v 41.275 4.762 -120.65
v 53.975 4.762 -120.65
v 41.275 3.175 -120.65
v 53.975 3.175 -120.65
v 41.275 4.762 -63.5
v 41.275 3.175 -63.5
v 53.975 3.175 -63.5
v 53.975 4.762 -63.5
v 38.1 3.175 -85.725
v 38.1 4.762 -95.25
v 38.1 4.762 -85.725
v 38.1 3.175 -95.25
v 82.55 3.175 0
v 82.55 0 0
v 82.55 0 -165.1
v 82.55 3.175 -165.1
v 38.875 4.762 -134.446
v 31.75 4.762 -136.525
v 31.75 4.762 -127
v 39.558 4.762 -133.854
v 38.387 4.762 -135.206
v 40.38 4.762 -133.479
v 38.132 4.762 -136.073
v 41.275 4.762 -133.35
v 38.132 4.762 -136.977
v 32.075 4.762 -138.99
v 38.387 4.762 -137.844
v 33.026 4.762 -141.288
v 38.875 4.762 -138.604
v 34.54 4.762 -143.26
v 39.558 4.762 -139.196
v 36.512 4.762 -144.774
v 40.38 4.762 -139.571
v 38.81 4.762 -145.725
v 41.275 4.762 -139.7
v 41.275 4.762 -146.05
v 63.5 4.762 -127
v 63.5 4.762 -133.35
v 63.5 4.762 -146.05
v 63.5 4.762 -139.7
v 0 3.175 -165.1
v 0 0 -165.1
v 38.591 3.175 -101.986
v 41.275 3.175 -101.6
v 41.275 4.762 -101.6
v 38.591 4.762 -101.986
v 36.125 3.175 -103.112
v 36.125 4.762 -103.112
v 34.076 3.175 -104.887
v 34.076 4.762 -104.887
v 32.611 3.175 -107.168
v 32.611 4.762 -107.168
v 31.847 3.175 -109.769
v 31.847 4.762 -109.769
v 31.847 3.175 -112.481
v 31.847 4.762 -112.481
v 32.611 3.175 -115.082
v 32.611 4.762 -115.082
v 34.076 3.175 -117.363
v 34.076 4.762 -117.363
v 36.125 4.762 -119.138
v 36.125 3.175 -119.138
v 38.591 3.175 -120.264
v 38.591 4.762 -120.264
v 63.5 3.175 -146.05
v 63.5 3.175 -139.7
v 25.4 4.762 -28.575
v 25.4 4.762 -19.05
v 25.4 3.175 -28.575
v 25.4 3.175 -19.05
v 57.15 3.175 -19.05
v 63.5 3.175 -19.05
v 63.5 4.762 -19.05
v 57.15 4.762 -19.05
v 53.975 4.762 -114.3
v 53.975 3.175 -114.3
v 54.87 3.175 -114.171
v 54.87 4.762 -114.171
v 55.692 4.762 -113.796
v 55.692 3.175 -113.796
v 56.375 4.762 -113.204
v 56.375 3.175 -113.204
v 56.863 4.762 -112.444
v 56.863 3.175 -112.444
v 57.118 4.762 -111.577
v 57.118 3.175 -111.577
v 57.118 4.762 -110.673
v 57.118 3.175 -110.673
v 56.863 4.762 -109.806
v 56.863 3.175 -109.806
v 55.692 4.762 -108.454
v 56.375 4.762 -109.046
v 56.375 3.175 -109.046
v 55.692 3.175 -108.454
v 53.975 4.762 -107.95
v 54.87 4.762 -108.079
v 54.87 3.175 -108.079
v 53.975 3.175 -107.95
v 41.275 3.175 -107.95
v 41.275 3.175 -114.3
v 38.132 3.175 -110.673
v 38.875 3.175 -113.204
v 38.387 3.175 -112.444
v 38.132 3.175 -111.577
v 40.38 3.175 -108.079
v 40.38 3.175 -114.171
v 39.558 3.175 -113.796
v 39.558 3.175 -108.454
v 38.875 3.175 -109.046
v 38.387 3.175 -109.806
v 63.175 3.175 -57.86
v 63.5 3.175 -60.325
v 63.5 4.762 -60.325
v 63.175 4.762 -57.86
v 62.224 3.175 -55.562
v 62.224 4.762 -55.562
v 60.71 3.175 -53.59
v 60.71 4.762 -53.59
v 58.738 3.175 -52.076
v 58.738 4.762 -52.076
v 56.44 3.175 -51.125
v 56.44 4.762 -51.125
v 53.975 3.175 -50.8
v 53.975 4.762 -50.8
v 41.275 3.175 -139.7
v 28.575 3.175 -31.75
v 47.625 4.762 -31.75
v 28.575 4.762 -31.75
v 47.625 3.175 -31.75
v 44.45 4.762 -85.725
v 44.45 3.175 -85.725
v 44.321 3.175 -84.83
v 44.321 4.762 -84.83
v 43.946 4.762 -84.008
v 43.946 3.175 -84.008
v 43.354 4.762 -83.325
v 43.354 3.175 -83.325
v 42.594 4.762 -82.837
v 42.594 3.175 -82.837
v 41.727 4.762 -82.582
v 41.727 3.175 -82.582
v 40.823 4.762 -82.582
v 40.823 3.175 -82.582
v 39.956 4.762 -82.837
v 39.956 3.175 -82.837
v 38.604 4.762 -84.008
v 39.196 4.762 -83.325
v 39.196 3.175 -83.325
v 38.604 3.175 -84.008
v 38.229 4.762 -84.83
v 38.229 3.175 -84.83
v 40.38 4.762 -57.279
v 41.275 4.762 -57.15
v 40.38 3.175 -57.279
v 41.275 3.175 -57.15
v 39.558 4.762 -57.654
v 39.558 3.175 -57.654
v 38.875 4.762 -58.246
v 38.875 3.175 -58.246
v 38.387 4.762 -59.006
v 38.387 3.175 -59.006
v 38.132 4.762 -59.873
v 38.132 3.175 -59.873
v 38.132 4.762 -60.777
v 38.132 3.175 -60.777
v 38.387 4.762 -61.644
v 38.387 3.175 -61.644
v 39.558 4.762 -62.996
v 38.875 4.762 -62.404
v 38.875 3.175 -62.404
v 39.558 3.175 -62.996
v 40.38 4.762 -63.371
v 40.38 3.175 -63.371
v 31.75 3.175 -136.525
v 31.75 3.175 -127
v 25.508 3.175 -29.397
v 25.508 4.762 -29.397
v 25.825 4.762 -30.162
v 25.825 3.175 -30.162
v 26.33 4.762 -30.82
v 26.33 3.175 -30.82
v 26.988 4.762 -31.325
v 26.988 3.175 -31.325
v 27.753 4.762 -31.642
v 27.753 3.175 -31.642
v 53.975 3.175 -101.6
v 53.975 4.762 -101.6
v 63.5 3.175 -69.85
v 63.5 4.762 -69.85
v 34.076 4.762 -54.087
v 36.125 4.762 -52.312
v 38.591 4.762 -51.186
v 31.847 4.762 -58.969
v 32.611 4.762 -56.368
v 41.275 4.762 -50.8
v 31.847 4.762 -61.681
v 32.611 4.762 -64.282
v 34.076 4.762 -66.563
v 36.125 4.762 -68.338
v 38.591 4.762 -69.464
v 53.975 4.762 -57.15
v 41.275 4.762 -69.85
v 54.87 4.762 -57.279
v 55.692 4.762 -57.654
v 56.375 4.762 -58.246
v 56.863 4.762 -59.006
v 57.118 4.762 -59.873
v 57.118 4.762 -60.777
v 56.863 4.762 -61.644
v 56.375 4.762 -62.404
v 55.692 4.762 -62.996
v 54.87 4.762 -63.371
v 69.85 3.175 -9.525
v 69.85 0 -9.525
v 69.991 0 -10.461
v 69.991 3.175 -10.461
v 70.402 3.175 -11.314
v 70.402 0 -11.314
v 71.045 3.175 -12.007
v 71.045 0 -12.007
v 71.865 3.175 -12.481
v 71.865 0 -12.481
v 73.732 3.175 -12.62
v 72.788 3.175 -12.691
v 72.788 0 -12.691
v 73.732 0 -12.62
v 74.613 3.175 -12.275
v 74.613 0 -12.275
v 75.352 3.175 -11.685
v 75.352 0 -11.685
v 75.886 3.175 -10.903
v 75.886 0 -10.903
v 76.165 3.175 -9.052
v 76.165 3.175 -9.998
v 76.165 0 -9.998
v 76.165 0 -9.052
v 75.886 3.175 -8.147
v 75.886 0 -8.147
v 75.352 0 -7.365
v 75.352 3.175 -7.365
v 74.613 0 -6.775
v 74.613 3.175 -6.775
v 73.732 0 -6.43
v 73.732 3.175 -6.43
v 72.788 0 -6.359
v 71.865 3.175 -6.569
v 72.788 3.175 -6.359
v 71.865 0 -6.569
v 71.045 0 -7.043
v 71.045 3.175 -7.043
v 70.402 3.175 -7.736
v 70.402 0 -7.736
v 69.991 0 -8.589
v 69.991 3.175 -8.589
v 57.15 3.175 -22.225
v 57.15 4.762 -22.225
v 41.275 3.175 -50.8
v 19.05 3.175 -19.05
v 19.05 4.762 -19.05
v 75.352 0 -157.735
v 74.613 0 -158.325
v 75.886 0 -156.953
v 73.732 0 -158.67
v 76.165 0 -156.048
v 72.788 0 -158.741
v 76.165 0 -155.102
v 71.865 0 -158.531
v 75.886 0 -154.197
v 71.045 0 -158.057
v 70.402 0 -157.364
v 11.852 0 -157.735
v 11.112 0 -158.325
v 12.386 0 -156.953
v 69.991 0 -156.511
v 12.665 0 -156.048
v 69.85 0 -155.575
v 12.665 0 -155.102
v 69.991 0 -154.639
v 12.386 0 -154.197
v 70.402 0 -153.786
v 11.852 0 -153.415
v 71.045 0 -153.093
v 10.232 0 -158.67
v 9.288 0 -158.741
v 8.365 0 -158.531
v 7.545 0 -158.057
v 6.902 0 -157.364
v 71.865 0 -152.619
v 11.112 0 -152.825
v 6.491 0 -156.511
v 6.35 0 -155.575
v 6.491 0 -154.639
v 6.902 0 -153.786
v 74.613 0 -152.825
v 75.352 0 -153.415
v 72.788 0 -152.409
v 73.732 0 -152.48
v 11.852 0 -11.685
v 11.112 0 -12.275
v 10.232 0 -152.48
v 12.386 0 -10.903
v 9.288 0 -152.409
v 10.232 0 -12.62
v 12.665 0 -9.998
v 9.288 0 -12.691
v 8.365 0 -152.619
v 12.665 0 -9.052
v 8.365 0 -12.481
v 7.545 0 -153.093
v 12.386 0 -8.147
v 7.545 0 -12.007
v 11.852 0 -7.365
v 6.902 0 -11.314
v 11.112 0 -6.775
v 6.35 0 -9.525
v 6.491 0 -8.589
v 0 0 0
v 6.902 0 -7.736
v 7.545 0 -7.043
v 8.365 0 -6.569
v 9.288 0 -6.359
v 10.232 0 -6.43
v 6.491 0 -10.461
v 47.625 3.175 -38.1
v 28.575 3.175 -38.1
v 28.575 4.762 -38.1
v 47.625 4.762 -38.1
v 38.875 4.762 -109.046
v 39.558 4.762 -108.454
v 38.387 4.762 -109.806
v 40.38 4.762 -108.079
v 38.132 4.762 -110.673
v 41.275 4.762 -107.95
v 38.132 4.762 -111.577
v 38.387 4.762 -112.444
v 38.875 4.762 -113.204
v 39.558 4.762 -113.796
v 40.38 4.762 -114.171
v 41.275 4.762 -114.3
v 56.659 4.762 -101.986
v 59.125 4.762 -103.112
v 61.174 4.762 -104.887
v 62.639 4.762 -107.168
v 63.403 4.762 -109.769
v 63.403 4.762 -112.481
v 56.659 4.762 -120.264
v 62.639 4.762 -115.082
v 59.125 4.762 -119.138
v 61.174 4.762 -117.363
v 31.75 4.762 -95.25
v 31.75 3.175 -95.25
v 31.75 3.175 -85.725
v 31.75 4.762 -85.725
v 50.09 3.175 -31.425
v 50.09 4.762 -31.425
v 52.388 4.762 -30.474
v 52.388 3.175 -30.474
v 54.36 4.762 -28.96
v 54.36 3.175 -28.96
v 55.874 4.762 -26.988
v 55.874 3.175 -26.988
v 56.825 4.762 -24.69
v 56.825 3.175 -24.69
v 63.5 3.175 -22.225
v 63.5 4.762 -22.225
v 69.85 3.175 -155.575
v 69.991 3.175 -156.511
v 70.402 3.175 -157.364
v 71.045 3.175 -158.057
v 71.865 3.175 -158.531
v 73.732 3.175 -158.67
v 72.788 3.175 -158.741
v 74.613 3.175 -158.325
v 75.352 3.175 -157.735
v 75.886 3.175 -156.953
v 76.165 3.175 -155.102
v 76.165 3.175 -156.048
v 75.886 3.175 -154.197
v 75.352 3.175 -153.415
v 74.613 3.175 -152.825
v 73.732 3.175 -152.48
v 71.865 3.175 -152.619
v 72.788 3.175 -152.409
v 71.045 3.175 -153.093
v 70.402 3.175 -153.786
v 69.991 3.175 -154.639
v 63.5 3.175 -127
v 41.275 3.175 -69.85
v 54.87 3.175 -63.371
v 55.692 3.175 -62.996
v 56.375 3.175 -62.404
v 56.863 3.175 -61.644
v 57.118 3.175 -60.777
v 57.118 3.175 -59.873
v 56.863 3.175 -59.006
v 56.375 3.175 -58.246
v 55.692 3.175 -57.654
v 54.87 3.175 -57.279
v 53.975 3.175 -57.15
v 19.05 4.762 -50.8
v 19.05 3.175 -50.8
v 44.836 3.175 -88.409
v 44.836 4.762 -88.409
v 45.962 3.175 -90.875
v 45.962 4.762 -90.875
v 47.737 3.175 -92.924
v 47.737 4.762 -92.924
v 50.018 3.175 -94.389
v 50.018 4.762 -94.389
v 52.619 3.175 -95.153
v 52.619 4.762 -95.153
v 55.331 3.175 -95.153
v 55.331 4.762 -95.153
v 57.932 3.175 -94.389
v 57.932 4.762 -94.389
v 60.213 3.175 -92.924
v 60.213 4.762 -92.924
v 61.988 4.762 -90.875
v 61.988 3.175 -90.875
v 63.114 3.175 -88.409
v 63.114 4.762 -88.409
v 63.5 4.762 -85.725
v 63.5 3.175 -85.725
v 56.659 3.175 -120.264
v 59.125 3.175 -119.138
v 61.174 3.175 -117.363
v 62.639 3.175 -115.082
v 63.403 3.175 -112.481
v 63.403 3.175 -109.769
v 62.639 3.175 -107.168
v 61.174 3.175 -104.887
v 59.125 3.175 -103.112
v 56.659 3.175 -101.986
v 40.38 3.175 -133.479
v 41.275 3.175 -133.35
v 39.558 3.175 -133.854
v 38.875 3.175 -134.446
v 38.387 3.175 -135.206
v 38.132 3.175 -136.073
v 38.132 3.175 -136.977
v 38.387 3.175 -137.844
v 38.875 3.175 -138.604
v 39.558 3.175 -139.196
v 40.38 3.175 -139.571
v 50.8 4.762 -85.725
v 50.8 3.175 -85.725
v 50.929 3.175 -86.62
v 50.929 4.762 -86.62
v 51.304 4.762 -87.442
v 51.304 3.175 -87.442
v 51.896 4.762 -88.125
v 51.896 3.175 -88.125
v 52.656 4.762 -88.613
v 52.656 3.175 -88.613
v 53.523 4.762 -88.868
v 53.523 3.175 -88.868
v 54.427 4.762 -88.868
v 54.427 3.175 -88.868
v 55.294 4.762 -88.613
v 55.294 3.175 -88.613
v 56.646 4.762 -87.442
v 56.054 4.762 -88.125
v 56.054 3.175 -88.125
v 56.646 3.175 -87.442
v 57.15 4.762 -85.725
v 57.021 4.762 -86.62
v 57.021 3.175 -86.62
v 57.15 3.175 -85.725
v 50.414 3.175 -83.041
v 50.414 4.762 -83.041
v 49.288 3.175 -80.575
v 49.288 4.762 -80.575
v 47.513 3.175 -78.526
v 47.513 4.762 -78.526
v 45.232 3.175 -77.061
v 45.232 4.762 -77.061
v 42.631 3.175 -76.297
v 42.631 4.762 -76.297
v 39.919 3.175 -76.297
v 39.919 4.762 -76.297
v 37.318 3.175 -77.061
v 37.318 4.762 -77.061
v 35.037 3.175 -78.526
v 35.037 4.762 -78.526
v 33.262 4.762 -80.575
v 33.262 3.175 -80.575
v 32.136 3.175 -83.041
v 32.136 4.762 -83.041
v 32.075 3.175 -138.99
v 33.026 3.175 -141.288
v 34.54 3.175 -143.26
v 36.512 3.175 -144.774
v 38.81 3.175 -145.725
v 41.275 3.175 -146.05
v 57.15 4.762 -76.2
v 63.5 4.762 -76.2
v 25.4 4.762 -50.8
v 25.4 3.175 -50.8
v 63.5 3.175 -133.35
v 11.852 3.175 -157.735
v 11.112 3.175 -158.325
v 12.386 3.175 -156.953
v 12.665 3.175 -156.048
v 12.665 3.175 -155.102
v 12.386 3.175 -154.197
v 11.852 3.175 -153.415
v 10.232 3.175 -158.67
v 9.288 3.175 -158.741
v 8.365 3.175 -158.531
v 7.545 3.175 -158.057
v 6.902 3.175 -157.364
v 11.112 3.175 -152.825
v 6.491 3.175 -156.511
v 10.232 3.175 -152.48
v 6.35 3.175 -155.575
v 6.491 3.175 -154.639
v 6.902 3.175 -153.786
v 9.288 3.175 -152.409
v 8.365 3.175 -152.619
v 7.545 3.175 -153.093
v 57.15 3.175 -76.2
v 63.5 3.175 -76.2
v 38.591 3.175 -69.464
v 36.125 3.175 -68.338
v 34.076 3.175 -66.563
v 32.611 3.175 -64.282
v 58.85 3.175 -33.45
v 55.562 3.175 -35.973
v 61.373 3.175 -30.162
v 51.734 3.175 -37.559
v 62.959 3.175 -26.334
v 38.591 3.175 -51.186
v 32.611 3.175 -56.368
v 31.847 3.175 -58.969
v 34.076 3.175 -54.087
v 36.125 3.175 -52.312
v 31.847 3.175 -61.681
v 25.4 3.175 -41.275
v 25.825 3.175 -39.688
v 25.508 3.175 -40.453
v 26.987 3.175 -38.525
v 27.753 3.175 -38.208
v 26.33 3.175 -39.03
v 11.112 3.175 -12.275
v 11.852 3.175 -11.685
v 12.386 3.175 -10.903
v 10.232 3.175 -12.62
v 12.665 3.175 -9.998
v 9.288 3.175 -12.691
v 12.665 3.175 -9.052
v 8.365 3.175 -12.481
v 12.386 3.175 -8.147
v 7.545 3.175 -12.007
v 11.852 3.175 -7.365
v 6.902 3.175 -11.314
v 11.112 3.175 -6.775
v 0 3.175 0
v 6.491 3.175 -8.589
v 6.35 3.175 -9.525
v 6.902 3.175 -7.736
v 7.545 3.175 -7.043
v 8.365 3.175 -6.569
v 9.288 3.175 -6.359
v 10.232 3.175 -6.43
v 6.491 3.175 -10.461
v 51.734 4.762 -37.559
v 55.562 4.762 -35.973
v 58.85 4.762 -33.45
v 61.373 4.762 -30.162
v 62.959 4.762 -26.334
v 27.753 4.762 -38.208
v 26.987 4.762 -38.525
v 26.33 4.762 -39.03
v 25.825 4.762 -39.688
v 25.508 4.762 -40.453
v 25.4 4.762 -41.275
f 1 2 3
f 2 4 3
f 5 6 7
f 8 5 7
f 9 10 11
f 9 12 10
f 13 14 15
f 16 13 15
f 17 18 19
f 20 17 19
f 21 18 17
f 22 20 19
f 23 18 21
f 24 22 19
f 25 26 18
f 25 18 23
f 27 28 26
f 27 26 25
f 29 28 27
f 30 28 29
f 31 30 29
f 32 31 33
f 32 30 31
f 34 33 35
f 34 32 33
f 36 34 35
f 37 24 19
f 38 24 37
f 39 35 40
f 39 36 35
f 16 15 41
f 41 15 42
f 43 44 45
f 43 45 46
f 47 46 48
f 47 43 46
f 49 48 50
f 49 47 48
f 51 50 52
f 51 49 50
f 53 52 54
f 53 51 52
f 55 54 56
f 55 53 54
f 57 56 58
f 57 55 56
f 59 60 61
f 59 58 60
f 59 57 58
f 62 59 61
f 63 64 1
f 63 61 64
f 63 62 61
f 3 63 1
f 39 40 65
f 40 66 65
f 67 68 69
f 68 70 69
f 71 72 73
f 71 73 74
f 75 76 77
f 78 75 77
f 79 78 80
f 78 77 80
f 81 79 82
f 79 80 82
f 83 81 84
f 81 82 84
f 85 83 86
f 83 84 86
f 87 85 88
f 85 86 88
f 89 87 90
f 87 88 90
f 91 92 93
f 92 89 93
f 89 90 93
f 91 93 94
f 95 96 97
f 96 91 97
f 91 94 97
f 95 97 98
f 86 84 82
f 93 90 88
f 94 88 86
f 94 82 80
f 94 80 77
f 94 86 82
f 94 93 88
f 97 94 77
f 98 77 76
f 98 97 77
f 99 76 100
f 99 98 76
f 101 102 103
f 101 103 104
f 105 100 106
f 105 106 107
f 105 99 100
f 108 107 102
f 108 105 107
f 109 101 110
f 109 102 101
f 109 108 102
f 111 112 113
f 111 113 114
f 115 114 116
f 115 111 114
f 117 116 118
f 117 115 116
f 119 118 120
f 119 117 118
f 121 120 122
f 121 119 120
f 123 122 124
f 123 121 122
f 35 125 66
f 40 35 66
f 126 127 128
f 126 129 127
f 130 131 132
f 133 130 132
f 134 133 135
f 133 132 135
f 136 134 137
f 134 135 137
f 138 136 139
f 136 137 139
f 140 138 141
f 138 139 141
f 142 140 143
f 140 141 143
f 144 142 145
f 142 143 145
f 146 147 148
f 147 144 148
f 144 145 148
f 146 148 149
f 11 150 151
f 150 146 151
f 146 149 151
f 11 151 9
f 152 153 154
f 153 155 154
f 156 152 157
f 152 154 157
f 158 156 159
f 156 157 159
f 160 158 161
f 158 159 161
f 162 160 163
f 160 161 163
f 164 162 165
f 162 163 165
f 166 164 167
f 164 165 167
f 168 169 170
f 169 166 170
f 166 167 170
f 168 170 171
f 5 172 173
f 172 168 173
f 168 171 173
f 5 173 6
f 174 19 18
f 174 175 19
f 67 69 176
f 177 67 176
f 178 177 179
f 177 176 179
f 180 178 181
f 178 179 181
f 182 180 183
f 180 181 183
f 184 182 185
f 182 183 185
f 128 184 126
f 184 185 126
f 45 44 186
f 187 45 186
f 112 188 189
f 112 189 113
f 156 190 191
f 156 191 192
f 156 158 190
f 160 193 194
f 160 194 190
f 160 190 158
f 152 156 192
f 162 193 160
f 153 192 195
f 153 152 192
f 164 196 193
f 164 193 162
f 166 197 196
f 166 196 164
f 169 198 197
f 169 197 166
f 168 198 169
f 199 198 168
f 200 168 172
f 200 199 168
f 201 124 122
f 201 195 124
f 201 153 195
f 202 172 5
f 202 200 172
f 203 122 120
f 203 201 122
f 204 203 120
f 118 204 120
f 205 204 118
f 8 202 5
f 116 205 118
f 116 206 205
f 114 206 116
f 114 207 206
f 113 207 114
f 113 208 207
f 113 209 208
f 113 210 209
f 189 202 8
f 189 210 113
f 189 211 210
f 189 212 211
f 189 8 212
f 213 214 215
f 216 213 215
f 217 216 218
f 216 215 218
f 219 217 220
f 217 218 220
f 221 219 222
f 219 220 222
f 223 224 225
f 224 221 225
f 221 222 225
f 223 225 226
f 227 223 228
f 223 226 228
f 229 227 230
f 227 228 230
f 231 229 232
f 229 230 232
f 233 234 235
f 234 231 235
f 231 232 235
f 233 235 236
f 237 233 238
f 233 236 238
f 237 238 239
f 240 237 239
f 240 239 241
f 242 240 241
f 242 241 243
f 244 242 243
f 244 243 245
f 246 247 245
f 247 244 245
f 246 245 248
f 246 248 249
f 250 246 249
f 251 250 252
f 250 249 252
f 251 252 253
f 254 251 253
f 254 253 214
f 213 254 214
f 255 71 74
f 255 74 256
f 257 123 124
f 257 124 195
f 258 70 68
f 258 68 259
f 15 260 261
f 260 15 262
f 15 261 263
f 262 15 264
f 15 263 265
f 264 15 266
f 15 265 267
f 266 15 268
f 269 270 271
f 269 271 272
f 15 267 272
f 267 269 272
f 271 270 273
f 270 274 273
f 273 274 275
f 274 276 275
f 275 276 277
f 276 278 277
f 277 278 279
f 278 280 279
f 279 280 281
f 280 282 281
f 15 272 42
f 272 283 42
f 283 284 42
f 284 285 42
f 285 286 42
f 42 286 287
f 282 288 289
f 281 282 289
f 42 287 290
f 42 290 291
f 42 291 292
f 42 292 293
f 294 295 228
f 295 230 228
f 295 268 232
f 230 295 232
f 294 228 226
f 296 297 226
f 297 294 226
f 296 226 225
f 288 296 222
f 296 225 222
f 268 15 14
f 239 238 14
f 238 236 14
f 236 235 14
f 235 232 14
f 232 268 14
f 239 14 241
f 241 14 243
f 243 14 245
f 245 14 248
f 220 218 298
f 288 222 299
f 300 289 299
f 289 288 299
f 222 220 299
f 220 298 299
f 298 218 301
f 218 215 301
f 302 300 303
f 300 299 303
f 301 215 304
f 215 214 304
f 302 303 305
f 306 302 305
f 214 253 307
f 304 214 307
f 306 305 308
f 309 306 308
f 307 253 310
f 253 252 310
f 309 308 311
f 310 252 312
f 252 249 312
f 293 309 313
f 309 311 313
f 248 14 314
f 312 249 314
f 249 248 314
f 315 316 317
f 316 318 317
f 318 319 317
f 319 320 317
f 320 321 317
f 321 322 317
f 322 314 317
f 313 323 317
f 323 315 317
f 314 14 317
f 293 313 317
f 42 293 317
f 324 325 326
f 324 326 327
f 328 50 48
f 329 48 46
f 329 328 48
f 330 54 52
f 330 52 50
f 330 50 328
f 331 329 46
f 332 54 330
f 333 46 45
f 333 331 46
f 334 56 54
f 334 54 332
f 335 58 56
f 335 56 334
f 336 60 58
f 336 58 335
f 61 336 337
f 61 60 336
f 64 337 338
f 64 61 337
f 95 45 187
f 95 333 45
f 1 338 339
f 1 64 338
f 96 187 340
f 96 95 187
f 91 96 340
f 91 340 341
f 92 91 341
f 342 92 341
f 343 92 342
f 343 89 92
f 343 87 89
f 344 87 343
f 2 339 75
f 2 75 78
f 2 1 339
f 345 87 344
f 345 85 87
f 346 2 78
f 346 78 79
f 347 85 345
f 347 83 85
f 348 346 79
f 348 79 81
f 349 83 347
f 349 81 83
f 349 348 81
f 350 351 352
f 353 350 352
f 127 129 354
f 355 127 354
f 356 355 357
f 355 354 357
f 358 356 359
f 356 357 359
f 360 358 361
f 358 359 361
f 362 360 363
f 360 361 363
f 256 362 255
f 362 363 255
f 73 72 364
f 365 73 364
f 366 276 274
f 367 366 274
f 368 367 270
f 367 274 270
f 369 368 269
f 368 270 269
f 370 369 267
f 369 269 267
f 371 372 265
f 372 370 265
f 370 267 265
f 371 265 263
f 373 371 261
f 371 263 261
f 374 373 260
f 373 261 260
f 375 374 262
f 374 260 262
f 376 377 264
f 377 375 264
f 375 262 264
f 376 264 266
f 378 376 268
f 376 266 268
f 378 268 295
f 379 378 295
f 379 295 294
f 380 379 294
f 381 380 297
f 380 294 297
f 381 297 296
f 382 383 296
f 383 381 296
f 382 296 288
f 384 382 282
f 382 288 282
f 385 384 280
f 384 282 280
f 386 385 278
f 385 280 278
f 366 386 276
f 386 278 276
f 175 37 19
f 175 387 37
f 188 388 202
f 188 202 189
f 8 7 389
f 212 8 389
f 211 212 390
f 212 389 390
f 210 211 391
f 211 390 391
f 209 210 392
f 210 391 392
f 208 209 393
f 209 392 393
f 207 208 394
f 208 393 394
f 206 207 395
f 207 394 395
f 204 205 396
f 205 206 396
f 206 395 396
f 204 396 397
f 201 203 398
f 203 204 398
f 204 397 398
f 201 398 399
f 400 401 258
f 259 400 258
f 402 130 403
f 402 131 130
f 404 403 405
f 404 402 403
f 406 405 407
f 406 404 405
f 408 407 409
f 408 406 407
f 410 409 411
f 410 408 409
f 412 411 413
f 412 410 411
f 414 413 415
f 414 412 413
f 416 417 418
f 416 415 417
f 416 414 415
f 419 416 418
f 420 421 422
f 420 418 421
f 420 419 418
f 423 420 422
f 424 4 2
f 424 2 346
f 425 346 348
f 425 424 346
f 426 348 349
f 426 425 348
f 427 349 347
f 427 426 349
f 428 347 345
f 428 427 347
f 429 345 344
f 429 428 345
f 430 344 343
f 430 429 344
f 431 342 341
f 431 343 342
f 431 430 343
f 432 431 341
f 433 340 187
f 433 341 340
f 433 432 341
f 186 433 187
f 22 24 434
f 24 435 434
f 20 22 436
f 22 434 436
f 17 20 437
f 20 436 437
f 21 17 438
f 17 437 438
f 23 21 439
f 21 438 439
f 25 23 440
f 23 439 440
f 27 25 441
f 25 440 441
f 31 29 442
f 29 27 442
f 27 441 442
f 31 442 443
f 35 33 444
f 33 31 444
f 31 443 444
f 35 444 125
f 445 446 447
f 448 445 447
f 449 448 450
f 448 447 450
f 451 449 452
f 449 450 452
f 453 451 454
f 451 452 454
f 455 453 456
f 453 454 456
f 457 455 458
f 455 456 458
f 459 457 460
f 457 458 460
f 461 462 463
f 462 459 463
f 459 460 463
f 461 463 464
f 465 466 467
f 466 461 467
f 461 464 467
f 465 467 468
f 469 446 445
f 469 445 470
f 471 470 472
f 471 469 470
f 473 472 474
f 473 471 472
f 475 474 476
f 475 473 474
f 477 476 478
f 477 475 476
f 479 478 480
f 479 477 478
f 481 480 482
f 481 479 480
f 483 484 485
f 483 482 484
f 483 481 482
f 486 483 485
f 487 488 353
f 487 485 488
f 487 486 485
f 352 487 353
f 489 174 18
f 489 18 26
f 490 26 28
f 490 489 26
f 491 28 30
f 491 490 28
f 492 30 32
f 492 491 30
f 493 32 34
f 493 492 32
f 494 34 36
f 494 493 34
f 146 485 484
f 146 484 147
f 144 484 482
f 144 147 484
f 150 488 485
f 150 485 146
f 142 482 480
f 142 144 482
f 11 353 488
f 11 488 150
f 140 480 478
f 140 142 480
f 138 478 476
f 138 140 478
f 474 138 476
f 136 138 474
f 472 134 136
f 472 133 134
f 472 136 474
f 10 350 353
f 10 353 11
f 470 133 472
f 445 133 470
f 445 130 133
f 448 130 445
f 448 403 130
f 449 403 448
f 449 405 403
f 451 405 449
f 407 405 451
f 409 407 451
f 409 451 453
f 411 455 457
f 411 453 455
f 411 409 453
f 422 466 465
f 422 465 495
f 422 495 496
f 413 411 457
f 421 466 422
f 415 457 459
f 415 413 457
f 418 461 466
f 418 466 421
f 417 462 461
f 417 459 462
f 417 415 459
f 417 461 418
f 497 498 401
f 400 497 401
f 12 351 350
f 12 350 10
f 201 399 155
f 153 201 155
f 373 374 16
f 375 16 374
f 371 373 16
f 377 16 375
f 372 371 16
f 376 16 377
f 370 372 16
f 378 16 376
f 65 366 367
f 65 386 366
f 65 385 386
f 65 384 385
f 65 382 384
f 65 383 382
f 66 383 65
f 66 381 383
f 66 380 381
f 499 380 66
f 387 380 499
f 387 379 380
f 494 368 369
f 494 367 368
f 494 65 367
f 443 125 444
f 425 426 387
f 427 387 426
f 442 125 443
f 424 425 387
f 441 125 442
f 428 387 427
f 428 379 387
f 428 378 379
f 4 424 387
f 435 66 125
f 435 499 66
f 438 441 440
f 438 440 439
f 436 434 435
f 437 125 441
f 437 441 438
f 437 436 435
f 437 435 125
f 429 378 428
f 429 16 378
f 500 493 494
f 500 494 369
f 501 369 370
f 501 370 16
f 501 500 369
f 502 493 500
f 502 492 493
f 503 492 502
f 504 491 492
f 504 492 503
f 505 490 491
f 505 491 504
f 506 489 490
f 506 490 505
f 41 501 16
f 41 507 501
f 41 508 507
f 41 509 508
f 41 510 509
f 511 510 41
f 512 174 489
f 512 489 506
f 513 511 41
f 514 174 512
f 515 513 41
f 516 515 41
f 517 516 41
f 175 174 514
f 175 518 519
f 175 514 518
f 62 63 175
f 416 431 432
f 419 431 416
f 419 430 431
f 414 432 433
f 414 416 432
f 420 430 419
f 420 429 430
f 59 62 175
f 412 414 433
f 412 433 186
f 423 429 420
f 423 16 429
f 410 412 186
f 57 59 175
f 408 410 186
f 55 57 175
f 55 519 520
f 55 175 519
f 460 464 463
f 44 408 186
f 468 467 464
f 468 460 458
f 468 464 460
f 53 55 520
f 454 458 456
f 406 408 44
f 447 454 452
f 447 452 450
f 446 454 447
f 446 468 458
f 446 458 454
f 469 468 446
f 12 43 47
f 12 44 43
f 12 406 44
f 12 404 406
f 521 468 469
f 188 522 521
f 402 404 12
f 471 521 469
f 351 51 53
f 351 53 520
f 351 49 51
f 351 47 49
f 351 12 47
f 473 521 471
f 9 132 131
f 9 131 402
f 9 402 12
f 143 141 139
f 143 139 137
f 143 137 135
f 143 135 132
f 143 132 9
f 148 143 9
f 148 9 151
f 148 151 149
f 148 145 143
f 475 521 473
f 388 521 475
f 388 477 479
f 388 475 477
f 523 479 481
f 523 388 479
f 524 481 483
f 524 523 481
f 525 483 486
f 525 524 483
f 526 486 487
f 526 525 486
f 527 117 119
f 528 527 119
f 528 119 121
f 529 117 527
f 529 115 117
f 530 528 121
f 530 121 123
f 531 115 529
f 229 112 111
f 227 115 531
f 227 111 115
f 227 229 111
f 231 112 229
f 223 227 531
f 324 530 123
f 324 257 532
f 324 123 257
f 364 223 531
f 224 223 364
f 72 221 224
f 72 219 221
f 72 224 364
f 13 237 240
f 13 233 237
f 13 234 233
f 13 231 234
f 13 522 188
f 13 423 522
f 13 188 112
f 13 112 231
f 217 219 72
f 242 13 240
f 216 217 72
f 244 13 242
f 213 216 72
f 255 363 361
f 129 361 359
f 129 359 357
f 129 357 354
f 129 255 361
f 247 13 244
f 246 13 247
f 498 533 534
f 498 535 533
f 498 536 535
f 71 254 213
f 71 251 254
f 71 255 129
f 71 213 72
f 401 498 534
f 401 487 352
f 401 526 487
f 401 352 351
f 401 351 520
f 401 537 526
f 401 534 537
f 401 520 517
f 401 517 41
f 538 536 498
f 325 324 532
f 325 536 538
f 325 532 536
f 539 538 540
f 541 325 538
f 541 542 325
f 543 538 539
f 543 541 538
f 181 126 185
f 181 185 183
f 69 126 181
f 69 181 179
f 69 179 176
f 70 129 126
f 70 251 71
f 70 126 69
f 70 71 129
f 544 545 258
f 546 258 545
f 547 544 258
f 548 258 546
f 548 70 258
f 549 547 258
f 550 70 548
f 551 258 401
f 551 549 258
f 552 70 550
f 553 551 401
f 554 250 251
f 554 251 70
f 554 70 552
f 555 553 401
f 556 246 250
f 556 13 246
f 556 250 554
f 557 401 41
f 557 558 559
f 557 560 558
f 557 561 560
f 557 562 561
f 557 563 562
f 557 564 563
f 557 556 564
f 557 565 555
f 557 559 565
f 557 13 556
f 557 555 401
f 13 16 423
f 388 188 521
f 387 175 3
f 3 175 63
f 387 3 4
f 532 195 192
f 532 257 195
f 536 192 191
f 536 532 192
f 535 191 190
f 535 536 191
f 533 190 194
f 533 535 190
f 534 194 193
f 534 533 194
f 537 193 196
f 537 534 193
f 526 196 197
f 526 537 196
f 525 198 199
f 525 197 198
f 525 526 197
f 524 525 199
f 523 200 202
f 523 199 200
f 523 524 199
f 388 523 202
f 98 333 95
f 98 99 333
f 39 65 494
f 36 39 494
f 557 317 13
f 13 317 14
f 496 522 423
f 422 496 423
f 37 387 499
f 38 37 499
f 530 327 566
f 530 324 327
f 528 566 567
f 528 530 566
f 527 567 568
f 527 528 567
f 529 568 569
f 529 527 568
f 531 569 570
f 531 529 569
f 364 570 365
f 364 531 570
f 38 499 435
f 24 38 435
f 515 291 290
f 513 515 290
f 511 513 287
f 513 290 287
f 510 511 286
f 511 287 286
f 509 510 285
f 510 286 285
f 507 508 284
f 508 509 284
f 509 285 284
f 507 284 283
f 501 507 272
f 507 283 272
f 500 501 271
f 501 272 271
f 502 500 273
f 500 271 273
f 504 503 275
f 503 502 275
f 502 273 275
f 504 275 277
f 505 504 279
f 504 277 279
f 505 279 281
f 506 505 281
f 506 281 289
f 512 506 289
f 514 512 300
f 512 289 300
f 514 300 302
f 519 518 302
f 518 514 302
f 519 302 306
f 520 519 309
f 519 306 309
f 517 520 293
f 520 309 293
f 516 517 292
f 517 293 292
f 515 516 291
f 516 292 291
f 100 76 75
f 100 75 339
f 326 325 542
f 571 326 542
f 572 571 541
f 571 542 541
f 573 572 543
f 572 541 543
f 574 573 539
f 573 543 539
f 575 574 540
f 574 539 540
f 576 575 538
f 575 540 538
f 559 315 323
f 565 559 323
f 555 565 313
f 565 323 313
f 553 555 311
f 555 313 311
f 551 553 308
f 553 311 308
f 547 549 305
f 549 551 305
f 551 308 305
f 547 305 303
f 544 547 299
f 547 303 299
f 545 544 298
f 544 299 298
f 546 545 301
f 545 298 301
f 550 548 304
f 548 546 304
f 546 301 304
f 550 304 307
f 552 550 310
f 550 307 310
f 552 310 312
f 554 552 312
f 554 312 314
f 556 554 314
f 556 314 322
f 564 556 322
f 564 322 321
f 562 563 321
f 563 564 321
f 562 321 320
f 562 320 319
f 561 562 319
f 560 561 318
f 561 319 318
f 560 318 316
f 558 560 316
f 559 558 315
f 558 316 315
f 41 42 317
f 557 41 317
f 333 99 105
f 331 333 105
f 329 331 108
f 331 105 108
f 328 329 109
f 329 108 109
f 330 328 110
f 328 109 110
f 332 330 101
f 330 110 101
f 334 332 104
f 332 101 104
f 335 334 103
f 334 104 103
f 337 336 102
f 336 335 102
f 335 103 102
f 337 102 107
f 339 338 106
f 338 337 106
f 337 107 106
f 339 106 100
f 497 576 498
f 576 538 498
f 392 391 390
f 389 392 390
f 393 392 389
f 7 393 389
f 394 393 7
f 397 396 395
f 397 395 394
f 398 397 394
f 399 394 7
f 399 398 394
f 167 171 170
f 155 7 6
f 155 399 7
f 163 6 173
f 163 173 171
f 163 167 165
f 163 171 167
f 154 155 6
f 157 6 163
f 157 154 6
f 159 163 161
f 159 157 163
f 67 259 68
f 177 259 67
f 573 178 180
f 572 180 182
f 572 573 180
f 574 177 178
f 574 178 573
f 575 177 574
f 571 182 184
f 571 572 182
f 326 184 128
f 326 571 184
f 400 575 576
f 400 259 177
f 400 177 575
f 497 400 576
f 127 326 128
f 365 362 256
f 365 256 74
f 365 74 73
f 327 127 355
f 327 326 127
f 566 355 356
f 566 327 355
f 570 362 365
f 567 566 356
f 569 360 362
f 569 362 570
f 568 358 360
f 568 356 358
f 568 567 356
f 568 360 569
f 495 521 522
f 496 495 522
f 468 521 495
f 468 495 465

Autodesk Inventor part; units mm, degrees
ref_plane "YZ Plane" through (0, 0, 0) normal (1, 0, 0) x (0, 1, 0)
ref_plane "XZ Plane" through (0, 0, 0) normal (0, 1, 0) x (-1, 0, 0)
ref_plane "XY Plane" through (0, 0, 0) normal (0, 0, 1) x (1, 0, 0)
sketch "Sketch1" plane through (0, 0, 0) normal (0, 1, 0) x (-1, 0, 0)
  line L0 (-82.55, -165.1) -> (0, -165.1)
  line L1 (0, -165.1) -> (0, 0)
  line L2 (0, 0) -> (-82.55, 0)
  line L3 (-82.55, 0) -> (-82.55, -165.1)
  circle A0 centre (-73.025, -155.575) radius 3.175
  circle A1 centre (-73.025, -155.575) radius 3.175
  circle A2 centre (-9.525, -155.575) radius 3.175
  circle A3 centre (-9.525, -155.575) radius 3.175
  circle A4 centre (-73.025, -9.525) radius 3.175
  circle A5 centre (-73.025, -9.525) radius 3.175
  circle A6 centre (-9.525, -9.525) radius 3.175
  circle A7 centre (-9.525, -9.525) radius 3.175
extrude "Extrusion1" add sketch "Sketch1" along normal blind 3.175
sketch "Sketch2" plane through (0, 3.175, 0) normal (0, 1, 0) x (1, 0, 0)
  line L0 (63.5, 19.05) -> (57.15, 19.05)
  line L1 (57.15, 19.05) -> (57.15, 22.225)
  line L2 (63.5, 19.05) -> (63.5, 22.225)
  arc A0 (57.15, 22.225) -> (47.625, 31.75) centre (47.625, 22.225) ccw
  arc A1 (63.5, 22.225) -> (47.625, 38.1) centre (47.625, 22.225) ccw
  line L3 (47.625, 31.75) -> (28.575, 31.75)
  line L4 (28.575, 38.1) -> (47.625, 38.1)
  arc A2 (28.575, 31.75) -> (25.4, 28.575) centre (28.575, 28.575) ccw
  arc A3 (25.4, 41.275) -> (28.575, 38.1) centre (28.575, 41.275) ccw
  line L5 (25.4, 19.05) -> (25.4, 28.575)
  line L6 (25.4, 19.05) -> (19.05, 19.05)
  line L7 (25.4, 41.275) -> (25.4, 50.8)
  line L8 (25.4, 50.8) -> (19.05, 50.8)
  line L9 (19.05, 50.8) -> (19.05, 19.05)
  point P0 (0, 0)
sketch "Sketch3" plane through (0, 3.175, 0) normal (0, 1, 0) x (1, 0, 0)
  point P0 (0, 0)
extrude "Extrusion2" add sketch "Sketch2" along normal blind 1.5875
sketch "Sketch4" plane through (0, 3.175, 0) normal (0, 1, 0) x (1, 0, 0)
  arc A0 (53.975, 57.15) -> (53.975, 63.5) centre (53.975, 60.325) ccw
  line L0 (53.975, 57.15) -> (41.275, 57.15)
  arc A1 (41.275, 63.5) -> (41.275, 57.15) centre (41.275, 60.325) ccw
  line L1 (41.275, 63.5) -> (53.975, 63.5)
  arc A2 (53.975, 50.8) -> (63.5, 60.325) centre (53.975, 60.325) ccw
  line L2 (53.975, 50.8) -> (41.275, 50.8)
  arc A3 (41.275, 69.85) -> (41.275, 50.8) centre (41.275, 60.325) ccw
  line L3 (41.275, 69.85) -> (63.5, 69.85)
  line L4 (63.5, 69.85) -> (63.5, 60.325)
  line L5 (57.15, 76.2) -> (63.5, 76.2)
  line L6 (63.5, 76.2) -> (63.5, 85.725)
  line L7 (57.15, 76.2) -> (57.15, 85.725)
  arc A4 (57.15, 85.725) -> (50.8, 85.725) centre (53.975, 85.725) ccw
  arc A5 (63.5, 85.725) -> (44.45, 85.725) centre (53.975, 85.725) ccw
  arc A6 (38.1, 85.725) -> (44.45, 85.725) centre (41.275, 85.725) ccw
  line L8 (31.75, 95.25) -> (38.1, 95.25)
  line L9 (38.1, 95.25) -> (38.1, 85.725)
  line L10 (41.275, 107.95) -> (53.975, 107.95)
  arc A7 (41.275, 114.3) -> (41.275, 107.95) centre (41.275, 111.125) ccw
  arc A8 (53.975, 107.95) -> (53.975, 114.3) centre (53.975, 111.125) ccw
  line L11 (53.975, 114.3) -> (41.275, 114.3)
  arc A9 (41.275, 120.65) -> (41.275, 101.6) centre (41.275, 111.125) ccw
  line L12 (41.275, 101.6) -> (53.975, 101.6)
  arc A10 (53.975, 101.6) -> (53.975, 120.65) centre (53.975, 111.125) ccw
  line L13 (53.975, 120.65) -> (41.275, 120.65)
  line L14 (63.5, 127) -> (63.5, 133.35)
  line L15 (63.5, 133.35) -> (41.275, 133.35)
  arc A11 (41.275, 139.7) -> (41.275, 133.35) centre (41.275, 136.525) ccw
  line L16 (41.275, 139.7) -> (63.5, 139.7)
  line L17 (63.5, 139.7) -> (63.5, 146.05)
  line L18 (63.5, 146.05) -> (41.275, 146.05)
  arc A12 (41.275, 146.05) -> (31.75, 136.525) centre (41.275, 136.525) ccw
  line L19 (63.5, 127) -> (31.75, 127)
  line L20 (31.75, 127) -> (31.75, 136.525)
  line L21 (57.15, 19.05) -> (57.15, 22.225) projected
  arc A13 (57.15, 22.225) -> (47.625, 31.75) centre (47.625, 22.225) ccw projected
  line L22 (47.625, 31.75) -> (28.575, 31.75) projected
  arc A14 (28.575, 31.75) -> (25.4, 28.575) centre (28.575, 28.575) ccw projected
  line L23 (25.4, 28.575) -> (25.4, 19.05) projected
  line L24 (25.4, 19.05) -> (19.05, 19.05) projected
  line L25 (19.05, 19.05) -> (19.05, 50.8) projected
  line L26 (19.05, 50.8) -> (25.4, 50.8) projected
  line L27 (25.4, 50.8) -> (25.4, 41.275) projected
  arc A15 (25.4, 41.275) -> (28.575, 38.1) centre (28.575, 41.275) ccw projected
  line L28 (28.575, 38.1) -> (47.625, 38.1) projected
  arc A16 (63.5, 22.225) -> (47.625, 38.1) centre (47.625, 22.225) ccw projected
  line L29 (63.5, 22.225) -> (63.5, 19.05) projected
  line L30 (63.5, 19.05) -> (57.15, 19.05) projected
  circle A17 centre (9.525, 9.525) radius 3.175 projected
  circle A18 centre (73.025, 9.525) radius 3.175 projected
  circle A19 centre (9.525, 155.575) radius 3.175 projected
  circle A20 centre (73.025, 155.575) radius 3.175 projected
  line L31 (82.55, 165.1) -> (0, 165.1) projected
  line L32 (0, 165.1) -> (0, 0) projected
  line L33 (0, 0) -> (82.55, 0) projected
  line L34 (82.55, 0) -> (82.55, 165.1) projected
  line L35 (31.75, 95.25) -> (31.75, 85.725)
  arc A21 (31.75, 85.725) -> (50.8, 85.725) centre (41.275, 85.725) ccw
extrude "Extrusion3" add sketch "Sketch4" along normal blind 1.5875 contours L2 A3 L3 L4 A2 | L7 A4 A21 L35 L8 L9 A6 A5 L6 L5 | L13 A10 L12 A9 | L19 L20 A12 L18 L17 L16 A11 L15 L14
properties part number "JASON"
